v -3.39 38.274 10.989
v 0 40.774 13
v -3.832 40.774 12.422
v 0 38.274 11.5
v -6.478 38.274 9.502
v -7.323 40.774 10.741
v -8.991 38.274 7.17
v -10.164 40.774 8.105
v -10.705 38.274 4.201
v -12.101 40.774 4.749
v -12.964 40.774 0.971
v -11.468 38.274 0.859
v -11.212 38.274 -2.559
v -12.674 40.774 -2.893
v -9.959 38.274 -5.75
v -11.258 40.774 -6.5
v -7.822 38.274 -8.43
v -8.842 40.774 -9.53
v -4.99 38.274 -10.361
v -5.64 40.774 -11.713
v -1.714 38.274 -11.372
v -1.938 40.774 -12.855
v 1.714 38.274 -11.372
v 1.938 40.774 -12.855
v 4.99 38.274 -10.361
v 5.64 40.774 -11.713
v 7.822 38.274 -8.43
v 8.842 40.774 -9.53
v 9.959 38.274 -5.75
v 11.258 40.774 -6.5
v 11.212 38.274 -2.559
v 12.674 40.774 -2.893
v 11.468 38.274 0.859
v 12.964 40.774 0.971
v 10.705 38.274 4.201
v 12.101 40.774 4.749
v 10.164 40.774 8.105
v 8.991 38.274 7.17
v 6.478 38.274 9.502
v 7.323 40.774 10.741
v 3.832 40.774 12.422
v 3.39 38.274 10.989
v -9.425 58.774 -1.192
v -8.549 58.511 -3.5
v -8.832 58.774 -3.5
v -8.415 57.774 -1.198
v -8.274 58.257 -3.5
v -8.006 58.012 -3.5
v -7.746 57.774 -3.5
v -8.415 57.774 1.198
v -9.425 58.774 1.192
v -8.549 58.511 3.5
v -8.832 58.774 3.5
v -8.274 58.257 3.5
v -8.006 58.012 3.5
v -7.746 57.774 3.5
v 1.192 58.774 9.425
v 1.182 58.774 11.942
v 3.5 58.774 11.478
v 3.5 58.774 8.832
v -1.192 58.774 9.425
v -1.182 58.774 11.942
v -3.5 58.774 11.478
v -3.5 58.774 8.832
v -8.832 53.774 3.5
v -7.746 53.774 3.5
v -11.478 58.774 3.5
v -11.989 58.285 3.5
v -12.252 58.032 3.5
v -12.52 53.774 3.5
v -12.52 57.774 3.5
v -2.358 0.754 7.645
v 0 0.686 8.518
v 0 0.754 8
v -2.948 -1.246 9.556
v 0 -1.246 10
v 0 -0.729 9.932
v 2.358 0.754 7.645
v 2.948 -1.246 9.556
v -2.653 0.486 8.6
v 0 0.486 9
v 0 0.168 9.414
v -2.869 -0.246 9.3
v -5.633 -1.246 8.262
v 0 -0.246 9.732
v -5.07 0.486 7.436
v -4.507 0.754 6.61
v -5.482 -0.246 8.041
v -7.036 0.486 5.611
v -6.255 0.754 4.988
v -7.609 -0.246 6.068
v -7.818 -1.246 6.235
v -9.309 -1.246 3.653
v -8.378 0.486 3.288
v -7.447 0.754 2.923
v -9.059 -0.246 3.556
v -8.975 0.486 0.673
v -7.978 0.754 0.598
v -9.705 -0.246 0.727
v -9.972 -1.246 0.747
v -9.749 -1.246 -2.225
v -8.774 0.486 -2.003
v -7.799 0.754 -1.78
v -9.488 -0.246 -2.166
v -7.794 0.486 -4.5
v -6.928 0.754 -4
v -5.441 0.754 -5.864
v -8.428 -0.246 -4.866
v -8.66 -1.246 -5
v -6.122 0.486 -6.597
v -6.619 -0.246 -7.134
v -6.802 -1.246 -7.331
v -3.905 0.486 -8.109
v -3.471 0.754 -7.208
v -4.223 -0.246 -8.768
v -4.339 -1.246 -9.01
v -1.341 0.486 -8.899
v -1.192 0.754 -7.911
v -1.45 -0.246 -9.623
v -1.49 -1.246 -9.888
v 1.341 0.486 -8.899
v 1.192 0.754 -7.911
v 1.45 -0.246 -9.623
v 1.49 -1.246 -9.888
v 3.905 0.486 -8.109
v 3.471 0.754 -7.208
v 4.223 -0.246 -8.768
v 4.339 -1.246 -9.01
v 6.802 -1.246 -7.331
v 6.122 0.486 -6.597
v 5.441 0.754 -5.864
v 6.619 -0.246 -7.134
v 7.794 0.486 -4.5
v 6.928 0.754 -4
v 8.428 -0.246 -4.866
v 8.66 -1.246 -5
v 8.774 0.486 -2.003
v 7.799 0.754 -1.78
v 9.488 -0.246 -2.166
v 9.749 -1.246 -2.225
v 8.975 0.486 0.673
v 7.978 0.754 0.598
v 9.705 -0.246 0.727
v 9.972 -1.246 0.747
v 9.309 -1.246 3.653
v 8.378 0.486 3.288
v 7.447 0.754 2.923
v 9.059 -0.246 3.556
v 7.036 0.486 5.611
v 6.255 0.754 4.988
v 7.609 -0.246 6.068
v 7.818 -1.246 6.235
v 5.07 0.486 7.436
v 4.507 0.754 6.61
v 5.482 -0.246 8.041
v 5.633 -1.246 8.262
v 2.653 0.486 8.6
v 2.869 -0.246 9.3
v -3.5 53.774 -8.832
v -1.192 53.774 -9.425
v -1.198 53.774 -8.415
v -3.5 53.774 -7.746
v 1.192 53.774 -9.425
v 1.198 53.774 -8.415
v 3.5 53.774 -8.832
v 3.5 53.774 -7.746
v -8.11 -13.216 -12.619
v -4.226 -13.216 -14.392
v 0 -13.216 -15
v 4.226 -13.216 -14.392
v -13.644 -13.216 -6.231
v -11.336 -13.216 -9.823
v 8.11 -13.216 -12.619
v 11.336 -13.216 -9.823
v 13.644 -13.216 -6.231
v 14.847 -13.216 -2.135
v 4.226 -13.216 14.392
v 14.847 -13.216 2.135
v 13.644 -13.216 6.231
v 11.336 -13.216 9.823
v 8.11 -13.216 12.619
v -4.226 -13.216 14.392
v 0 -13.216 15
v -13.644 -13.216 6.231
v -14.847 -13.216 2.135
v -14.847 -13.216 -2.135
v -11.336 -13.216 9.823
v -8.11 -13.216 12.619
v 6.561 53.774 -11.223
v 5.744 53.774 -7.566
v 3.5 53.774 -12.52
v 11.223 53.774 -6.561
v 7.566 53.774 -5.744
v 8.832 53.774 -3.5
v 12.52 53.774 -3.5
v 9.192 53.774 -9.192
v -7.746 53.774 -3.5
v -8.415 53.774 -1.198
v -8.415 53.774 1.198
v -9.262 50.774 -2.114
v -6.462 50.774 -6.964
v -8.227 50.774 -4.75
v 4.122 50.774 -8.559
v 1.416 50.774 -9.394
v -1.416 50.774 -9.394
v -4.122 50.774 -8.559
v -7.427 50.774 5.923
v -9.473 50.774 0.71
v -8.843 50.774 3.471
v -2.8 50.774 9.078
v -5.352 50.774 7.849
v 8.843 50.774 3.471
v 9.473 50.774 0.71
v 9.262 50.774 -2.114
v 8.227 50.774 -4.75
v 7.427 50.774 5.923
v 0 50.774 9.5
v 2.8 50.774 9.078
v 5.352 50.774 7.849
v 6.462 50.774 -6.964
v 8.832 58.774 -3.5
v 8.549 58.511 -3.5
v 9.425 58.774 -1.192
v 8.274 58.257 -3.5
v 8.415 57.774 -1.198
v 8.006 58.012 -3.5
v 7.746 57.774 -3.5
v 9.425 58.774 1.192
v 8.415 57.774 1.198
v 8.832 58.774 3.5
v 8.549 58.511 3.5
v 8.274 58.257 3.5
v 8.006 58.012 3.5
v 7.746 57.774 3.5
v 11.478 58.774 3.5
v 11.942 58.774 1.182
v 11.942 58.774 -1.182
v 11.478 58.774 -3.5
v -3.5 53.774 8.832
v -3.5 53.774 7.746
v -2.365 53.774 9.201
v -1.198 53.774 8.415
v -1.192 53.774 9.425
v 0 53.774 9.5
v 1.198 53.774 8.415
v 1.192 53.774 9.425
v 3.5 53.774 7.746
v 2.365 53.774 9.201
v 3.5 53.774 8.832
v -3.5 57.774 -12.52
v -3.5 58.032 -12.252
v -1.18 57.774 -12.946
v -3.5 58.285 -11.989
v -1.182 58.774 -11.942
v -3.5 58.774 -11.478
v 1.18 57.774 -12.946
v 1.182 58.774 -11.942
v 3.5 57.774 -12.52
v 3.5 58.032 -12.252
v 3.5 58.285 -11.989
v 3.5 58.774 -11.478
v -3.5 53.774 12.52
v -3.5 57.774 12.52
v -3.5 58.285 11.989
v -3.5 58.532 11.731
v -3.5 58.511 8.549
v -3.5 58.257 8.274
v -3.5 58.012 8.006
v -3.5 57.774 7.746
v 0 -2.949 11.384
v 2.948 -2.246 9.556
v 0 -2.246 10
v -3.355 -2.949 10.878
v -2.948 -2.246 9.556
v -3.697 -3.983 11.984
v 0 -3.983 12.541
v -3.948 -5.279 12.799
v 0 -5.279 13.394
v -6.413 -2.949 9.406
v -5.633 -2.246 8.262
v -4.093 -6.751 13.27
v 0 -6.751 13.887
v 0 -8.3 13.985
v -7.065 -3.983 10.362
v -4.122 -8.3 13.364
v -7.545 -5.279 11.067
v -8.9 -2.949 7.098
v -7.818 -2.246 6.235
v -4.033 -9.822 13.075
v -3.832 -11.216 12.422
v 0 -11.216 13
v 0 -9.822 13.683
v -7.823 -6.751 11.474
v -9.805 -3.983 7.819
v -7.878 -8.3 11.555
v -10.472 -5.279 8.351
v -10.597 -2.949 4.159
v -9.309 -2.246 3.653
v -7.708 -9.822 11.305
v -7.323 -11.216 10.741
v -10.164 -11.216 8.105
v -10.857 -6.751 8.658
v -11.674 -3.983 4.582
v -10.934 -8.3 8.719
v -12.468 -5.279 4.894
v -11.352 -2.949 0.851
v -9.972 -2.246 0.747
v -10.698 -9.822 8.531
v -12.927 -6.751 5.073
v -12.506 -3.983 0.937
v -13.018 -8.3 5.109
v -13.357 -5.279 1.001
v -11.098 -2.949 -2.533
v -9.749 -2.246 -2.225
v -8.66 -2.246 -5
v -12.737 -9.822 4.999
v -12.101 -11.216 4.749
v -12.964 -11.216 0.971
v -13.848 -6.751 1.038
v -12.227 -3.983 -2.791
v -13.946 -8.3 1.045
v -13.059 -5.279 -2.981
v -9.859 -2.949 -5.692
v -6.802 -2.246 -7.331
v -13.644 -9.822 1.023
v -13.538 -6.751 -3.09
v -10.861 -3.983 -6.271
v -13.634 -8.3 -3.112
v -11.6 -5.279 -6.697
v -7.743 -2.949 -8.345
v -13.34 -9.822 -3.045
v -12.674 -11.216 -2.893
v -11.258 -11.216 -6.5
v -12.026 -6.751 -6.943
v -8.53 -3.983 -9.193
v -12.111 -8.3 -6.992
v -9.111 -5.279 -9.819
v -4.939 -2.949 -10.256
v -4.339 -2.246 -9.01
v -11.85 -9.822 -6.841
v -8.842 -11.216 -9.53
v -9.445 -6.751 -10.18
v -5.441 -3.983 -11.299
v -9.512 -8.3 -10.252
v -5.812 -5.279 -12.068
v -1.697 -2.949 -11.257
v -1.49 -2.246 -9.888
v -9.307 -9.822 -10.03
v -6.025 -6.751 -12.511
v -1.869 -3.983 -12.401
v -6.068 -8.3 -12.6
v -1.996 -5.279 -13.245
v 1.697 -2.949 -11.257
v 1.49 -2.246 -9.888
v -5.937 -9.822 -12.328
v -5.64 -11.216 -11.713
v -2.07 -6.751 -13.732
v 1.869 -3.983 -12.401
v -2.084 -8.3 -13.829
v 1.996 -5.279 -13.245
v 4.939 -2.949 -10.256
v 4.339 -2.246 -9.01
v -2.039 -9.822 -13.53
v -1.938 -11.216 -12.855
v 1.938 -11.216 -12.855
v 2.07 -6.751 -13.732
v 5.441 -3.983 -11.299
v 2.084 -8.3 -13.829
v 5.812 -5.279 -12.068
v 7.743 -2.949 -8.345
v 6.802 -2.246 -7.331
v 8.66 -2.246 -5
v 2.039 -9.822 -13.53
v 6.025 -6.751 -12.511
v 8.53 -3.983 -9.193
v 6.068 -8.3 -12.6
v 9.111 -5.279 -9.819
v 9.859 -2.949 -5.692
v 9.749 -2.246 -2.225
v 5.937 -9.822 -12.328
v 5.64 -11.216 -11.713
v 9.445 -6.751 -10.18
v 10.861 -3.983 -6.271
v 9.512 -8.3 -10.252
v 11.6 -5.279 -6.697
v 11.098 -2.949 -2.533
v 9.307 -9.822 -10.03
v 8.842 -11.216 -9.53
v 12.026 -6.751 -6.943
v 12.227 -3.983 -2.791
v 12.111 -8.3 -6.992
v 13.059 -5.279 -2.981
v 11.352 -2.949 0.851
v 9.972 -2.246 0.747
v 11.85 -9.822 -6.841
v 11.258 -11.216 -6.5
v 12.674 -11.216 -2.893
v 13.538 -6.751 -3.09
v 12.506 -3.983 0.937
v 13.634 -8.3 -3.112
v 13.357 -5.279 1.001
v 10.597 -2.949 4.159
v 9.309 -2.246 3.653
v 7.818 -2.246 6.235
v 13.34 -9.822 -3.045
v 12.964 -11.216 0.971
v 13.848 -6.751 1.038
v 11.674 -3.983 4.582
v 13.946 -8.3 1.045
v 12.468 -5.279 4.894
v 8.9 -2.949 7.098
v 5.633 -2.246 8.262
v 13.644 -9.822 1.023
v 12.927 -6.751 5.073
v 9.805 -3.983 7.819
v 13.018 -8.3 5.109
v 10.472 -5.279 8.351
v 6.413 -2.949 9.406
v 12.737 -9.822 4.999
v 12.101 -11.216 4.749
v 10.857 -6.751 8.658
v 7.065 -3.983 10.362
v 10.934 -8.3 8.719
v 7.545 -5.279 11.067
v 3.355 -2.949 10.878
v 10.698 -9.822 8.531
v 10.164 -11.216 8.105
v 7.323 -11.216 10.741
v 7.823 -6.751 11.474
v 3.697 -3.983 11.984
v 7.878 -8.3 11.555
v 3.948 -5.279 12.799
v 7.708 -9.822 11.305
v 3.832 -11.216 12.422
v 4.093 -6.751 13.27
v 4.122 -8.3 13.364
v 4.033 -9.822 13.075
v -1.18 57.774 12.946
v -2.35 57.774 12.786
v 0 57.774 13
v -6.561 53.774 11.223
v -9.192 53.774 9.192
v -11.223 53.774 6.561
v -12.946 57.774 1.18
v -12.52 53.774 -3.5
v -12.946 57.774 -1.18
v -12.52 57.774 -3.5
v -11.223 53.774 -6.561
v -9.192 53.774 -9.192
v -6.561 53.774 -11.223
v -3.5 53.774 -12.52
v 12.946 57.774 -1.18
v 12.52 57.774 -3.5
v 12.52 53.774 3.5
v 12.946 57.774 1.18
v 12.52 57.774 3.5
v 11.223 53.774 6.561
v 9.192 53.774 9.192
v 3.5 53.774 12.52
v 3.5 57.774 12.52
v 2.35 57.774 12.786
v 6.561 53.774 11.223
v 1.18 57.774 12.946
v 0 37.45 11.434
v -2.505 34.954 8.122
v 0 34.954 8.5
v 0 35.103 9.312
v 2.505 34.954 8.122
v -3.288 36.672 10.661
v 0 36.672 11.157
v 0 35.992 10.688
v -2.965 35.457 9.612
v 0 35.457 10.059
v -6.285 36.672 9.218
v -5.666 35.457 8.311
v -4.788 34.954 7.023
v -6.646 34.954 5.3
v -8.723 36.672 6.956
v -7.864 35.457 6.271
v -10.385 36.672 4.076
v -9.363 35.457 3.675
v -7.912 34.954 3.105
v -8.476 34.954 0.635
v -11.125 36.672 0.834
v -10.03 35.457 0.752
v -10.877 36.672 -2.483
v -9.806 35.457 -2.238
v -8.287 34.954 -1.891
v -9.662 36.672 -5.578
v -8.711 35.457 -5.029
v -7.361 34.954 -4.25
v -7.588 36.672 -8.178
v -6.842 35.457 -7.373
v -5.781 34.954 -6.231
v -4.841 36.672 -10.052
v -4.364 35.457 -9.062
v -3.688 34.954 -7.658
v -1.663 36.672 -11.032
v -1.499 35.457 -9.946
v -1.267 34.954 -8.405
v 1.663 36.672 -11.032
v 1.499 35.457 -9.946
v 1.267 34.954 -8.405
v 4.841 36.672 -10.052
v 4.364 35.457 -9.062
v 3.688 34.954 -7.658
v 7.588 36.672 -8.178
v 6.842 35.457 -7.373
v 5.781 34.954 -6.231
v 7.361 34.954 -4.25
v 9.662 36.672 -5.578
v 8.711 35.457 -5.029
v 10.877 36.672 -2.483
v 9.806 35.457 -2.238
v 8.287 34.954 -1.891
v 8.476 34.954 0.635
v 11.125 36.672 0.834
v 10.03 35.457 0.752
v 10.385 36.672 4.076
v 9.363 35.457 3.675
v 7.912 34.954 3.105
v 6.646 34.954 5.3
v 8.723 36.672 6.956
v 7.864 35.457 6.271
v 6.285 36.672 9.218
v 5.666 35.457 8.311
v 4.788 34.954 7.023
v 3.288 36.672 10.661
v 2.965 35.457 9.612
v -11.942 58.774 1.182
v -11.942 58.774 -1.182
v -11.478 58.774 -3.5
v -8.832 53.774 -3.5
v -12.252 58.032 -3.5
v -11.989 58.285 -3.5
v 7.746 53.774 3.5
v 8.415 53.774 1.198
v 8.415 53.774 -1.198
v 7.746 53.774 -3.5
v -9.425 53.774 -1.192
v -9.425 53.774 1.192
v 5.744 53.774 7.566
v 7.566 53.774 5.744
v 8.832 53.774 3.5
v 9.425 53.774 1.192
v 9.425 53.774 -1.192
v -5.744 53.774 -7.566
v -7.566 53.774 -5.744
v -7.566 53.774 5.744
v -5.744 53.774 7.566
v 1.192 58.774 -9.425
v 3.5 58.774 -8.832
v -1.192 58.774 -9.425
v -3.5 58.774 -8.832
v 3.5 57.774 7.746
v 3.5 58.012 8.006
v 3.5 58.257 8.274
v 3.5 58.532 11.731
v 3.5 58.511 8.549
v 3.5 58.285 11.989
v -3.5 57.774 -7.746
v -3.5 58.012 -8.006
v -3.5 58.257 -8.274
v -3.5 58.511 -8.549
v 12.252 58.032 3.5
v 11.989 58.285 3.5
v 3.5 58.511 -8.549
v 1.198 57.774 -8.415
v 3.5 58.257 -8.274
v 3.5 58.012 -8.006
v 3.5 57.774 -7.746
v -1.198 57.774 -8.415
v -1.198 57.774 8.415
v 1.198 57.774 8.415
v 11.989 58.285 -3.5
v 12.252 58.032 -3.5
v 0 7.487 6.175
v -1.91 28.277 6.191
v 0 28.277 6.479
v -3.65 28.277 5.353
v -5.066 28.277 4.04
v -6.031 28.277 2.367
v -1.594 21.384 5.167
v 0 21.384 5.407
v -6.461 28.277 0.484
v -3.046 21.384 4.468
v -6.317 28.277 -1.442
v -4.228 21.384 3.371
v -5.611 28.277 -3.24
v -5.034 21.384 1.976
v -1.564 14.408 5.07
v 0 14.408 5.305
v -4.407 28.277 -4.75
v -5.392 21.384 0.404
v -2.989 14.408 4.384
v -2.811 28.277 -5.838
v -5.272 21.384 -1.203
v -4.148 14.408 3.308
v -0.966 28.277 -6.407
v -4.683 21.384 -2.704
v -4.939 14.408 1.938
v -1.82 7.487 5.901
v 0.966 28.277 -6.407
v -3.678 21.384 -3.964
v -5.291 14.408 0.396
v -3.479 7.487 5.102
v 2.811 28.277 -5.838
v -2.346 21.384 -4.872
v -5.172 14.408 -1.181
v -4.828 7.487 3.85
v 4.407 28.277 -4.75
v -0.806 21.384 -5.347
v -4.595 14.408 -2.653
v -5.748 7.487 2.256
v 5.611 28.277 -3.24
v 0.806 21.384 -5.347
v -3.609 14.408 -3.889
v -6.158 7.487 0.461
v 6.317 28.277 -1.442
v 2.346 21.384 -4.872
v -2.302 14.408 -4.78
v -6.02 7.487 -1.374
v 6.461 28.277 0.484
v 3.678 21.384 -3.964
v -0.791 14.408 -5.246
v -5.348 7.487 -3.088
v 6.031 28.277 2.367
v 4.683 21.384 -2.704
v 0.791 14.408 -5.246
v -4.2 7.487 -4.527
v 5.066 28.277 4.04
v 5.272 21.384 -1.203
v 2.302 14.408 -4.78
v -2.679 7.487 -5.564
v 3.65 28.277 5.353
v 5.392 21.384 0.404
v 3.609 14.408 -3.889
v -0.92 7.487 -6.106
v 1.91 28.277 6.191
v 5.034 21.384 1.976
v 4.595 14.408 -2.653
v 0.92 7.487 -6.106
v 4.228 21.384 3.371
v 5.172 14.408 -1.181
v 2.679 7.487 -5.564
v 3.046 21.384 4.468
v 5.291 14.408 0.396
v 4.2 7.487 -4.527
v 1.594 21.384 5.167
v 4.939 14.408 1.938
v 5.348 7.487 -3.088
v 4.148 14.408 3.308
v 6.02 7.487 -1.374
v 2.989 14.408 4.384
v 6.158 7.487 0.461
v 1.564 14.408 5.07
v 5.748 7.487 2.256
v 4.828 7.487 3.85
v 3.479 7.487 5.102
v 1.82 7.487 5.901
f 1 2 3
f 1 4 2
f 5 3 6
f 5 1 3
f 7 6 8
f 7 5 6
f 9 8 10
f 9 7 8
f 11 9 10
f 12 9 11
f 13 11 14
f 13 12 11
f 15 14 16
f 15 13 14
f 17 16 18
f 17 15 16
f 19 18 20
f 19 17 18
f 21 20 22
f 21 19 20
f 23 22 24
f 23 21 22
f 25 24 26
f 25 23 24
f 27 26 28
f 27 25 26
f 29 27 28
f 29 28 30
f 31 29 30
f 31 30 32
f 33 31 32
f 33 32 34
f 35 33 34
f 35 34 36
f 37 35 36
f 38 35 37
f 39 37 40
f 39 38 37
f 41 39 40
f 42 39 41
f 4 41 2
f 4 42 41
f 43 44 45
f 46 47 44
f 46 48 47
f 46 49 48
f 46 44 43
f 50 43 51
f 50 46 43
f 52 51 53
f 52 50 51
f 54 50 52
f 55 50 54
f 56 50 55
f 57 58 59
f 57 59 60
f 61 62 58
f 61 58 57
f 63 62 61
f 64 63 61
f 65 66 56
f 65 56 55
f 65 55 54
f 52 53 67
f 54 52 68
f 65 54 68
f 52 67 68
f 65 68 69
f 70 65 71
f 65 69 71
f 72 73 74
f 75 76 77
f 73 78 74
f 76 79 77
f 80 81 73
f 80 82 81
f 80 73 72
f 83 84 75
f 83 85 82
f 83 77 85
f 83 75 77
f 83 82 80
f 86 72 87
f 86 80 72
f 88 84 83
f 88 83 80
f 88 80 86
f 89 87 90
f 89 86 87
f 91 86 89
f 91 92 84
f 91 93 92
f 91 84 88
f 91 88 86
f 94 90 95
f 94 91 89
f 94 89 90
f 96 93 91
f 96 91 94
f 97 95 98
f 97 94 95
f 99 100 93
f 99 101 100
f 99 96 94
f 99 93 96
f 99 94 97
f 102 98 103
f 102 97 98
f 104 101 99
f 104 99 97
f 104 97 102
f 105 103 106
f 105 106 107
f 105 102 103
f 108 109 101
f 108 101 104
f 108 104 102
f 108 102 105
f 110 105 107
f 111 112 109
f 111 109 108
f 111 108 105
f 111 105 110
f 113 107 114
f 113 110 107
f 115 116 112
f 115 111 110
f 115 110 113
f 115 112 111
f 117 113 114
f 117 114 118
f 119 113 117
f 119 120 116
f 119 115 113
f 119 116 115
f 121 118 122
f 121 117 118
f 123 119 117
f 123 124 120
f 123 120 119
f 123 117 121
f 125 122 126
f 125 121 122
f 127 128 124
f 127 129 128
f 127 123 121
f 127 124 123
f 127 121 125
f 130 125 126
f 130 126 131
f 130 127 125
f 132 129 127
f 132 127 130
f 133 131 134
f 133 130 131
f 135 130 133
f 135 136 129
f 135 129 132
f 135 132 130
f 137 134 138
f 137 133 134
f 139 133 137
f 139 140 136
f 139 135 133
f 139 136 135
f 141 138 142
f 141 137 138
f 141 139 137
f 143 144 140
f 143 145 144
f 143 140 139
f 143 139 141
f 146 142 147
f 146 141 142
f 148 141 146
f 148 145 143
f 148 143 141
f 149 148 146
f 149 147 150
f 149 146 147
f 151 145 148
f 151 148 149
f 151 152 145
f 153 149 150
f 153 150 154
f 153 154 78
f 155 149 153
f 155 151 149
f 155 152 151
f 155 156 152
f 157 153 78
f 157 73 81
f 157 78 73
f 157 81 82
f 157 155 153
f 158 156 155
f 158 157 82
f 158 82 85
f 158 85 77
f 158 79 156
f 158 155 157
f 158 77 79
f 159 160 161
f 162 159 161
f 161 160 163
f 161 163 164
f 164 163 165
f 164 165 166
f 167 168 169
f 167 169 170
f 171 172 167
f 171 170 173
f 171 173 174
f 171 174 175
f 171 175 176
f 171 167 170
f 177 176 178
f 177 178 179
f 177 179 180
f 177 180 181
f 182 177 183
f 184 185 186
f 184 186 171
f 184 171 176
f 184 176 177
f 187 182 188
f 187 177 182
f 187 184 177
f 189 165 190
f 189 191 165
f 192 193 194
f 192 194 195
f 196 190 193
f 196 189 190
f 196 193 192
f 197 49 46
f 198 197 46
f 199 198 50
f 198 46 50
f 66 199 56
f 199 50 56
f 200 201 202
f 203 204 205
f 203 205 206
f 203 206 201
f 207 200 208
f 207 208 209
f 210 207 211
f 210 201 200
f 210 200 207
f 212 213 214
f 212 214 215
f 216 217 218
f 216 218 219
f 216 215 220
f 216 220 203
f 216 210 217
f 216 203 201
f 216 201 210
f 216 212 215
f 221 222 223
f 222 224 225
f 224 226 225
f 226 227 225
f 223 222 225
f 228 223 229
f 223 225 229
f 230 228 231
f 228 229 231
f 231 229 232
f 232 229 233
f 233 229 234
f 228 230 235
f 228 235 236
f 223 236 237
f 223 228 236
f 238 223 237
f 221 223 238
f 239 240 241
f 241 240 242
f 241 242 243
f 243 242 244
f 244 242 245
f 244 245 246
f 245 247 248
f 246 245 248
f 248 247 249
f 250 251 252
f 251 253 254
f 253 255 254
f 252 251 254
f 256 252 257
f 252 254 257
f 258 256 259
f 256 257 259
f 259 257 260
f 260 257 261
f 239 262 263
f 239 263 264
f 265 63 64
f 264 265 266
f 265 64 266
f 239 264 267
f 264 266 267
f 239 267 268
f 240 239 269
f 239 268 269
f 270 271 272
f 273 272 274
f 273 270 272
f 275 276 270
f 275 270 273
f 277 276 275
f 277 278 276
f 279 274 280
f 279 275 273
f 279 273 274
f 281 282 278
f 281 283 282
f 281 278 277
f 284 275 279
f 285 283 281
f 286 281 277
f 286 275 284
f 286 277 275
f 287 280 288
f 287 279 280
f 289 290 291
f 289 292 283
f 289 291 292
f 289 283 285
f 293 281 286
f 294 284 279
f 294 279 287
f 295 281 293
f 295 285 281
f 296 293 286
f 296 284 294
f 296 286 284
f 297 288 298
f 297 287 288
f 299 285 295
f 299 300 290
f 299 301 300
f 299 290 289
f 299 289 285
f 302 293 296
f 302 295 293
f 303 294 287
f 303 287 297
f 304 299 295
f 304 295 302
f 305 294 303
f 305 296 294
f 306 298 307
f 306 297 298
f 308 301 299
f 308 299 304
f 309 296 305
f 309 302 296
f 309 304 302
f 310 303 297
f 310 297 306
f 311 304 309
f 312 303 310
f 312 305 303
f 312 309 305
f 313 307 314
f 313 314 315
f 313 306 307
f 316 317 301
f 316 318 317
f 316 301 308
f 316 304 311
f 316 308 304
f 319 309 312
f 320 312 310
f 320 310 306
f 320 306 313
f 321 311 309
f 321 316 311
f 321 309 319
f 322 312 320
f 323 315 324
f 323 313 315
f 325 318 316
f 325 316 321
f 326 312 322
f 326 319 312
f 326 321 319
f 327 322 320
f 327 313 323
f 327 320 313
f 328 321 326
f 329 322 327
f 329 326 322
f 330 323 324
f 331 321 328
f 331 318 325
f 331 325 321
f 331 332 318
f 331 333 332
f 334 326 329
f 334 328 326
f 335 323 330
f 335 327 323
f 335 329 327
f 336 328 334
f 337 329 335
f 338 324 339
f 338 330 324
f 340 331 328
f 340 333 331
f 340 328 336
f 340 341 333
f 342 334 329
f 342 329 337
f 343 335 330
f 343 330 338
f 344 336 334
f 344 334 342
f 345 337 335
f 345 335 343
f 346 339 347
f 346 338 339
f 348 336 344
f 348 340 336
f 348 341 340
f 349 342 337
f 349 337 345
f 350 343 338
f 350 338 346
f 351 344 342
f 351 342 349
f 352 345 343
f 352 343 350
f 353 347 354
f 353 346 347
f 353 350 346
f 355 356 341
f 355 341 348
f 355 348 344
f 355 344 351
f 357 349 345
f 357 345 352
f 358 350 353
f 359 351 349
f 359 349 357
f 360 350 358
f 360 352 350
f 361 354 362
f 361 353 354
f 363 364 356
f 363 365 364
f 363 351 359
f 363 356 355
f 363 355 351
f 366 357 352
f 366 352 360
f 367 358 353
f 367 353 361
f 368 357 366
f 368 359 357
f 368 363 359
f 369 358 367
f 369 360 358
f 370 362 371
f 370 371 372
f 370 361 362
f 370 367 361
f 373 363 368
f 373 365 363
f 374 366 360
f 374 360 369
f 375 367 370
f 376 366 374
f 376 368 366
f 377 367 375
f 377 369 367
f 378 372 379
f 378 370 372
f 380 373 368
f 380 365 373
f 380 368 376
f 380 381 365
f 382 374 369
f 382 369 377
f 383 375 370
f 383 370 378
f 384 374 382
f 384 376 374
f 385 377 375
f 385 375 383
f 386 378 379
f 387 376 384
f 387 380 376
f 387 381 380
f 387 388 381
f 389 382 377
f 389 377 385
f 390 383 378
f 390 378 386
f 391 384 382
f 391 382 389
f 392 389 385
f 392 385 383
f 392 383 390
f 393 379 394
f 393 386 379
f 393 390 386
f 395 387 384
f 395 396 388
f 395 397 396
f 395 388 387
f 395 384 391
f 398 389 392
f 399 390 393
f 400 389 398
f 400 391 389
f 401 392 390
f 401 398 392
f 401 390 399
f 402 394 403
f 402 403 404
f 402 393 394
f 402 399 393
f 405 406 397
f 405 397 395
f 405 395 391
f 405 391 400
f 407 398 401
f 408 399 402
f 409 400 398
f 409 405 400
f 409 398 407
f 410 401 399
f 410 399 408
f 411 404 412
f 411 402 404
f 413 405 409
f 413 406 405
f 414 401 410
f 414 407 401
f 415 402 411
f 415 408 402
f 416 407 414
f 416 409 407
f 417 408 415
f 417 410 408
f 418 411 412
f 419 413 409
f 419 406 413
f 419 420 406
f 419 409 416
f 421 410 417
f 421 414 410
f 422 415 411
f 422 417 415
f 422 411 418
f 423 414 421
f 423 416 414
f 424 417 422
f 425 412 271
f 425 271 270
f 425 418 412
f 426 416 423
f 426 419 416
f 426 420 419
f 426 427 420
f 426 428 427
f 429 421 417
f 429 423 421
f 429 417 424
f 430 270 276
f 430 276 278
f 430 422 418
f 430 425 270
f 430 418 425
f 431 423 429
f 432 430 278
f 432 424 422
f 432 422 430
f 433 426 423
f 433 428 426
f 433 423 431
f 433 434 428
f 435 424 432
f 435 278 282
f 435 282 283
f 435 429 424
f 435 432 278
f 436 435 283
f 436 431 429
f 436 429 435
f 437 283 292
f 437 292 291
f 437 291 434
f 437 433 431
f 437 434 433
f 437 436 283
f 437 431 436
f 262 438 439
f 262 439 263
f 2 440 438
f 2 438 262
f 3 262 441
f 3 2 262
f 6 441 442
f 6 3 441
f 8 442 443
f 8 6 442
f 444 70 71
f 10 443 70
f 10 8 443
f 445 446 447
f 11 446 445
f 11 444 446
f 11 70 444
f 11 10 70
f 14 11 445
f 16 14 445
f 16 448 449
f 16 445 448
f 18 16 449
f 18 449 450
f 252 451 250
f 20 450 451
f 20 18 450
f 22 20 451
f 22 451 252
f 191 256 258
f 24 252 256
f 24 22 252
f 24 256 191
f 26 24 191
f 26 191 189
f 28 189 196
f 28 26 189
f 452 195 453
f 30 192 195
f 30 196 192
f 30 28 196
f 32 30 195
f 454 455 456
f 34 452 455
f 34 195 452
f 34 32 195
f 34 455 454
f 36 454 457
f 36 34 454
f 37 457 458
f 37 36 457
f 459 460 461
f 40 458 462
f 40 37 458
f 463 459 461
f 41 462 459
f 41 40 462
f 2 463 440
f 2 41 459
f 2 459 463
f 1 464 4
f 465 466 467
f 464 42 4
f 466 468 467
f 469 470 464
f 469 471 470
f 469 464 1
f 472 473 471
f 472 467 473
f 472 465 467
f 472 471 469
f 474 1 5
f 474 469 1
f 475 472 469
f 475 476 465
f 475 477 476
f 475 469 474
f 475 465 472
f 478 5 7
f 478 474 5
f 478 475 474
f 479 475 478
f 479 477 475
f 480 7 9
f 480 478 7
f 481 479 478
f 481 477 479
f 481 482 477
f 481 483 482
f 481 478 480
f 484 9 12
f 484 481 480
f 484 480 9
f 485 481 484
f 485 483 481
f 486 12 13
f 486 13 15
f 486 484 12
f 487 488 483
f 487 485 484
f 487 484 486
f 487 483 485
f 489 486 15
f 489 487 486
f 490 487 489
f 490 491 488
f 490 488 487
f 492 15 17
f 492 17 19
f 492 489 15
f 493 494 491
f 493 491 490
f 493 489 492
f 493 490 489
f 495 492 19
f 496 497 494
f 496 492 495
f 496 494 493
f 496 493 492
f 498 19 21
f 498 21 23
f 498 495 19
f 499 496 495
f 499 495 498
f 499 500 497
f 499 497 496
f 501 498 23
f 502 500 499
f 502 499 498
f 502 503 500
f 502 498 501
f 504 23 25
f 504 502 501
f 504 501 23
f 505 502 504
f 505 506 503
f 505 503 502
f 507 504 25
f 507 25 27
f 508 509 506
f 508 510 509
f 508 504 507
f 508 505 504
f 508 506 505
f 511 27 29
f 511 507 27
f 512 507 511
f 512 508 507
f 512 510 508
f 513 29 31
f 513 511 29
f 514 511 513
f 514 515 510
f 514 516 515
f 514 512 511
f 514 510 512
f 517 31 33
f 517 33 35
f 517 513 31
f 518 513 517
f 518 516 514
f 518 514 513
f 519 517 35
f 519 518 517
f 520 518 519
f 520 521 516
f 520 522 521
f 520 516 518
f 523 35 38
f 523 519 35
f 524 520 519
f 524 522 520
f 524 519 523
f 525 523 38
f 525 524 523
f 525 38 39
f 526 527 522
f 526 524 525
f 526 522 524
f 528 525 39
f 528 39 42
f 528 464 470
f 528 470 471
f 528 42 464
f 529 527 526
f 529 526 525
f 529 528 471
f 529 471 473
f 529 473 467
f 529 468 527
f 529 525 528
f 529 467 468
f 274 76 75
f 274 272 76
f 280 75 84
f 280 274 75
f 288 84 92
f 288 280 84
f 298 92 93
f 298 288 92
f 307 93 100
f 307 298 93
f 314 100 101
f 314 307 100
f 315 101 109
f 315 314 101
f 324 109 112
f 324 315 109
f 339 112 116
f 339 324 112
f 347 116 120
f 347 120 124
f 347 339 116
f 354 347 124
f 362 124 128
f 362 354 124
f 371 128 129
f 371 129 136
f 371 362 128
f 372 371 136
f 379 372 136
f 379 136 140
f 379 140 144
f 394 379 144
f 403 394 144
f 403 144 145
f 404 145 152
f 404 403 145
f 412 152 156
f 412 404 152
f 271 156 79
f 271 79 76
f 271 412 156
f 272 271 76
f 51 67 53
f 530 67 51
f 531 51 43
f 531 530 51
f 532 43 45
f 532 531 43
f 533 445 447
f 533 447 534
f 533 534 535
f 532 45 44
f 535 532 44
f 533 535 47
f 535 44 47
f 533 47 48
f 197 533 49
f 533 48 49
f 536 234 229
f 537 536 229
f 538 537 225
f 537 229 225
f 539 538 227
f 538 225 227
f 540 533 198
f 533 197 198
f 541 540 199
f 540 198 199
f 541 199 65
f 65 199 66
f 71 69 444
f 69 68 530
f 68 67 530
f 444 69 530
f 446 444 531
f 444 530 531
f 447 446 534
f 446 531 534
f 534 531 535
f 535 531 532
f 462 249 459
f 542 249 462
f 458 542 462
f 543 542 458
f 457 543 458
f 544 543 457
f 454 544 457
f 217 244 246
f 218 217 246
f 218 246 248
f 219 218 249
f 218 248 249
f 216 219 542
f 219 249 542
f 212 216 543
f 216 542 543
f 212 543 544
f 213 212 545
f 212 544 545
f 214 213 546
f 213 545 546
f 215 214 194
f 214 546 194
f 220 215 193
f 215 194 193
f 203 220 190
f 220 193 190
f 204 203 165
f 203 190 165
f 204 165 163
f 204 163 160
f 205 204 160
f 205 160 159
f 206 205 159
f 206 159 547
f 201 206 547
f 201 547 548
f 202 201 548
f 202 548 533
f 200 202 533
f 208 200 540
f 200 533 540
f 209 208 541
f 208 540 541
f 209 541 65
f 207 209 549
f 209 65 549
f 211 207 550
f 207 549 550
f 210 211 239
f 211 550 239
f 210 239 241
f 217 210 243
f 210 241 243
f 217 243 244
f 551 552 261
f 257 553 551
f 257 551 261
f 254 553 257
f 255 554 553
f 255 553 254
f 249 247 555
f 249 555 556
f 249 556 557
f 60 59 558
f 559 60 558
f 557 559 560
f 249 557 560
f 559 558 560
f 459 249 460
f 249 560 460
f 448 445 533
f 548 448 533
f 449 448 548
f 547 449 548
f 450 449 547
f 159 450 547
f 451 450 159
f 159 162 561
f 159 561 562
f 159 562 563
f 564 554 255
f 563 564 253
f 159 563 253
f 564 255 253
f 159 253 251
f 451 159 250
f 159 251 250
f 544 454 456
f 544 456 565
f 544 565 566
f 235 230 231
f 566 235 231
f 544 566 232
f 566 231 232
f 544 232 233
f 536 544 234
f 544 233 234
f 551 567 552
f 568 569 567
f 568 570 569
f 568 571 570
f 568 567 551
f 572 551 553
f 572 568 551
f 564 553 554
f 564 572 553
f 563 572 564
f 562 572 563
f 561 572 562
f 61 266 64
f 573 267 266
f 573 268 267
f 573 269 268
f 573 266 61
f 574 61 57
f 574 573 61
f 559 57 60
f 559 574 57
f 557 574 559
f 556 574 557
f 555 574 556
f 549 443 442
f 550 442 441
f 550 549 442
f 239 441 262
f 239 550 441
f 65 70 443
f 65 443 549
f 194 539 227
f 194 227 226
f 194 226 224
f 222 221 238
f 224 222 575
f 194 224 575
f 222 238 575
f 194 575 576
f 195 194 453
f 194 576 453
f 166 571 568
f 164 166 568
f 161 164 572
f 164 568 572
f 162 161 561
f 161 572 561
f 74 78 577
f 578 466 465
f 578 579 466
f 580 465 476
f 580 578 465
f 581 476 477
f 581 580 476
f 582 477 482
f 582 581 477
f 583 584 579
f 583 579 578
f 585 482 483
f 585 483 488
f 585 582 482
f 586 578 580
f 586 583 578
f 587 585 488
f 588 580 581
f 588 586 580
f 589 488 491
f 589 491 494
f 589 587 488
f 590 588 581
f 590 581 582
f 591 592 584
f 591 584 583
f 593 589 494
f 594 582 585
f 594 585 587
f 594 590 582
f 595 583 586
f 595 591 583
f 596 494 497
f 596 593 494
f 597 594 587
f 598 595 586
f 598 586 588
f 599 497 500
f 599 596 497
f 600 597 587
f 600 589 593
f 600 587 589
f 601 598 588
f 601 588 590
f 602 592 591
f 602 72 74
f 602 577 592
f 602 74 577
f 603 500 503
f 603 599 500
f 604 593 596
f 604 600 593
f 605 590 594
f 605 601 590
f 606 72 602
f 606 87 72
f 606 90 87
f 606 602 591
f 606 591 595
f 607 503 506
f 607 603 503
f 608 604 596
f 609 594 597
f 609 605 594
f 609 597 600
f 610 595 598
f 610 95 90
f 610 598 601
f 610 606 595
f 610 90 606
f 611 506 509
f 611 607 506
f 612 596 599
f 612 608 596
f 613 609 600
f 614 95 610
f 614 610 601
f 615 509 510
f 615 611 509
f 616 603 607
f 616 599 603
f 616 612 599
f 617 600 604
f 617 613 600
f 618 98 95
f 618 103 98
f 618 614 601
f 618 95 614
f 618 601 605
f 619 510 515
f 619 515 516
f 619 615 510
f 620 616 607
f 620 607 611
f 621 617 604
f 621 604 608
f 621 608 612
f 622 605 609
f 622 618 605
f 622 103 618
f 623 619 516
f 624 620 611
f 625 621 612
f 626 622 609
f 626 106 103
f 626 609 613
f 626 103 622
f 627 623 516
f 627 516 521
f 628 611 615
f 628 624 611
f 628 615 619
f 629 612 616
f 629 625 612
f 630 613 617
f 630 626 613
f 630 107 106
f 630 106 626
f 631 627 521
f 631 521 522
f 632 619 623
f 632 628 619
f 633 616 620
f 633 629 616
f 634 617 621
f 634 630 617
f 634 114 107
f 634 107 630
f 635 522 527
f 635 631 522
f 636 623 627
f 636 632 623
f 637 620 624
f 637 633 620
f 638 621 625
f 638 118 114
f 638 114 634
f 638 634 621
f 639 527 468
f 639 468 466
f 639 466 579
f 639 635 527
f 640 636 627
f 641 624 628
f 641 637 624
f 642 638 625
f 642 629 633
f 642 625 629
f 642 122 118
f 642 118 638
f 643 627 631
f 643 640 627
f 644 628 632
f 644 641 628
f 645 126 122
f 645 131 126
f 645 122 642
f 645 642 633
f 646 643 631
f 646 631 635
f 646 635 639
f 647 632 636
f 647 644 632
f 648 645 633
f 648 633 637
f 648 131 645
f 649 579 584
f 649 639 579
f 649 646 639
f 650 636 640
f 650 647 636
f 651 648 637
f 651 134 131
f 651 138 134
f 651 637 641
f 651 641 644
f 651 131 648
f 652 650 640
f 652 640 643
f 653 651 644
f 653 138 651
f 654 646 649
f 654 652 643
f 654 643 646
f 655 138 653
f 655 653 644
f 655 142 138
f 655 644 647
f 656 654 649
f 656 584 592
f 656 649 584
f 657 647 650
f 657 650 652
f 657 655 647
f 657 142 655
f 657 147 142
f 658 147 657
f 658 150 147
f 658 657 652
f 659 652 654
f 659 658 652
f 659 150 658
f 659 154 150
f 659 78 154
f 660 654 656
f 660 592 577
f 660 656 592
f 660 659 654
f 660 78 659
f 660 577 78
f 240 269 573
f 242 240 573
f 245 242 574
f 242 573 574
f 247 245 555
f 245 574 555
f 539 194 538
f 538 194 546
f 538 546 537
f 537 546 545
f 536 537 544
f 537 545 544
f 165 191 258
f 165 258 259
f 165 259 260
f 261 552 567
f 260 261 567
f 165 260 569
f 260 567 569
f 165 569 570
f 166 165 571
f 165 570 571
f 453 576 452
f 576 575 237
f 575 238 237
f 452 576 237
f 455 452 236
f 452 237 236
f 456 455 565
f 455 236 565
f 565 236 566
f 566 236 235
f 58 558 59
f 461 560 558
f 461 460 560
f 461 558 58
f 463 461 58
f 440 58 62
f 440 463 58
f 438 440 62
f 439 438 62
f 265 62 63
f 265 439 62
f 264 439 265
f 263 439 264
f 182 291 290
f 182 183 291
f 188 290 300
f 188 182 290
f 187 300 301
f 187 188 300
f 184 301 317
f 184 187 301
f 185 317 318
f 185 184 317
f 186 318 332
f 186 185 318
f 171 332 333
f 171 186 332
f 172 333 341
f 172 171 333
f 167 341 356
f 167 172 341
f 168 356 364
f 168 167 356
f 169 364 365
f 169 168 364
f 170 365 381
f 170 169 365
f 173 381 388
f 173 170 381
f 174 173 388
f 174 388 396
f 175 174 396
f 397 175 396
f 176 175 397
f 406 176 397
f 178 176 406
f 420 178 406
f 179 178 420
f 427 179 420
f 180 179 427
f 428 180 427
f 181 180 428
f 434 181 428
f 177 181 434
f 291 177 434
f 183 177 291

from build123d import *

# Parameters (mm, degrees)
CUT_EXTRUDE1_DEPTH = 5
SKETCH3_R          = 8.5
CUT_EXTRUDE2_DEPTH = 5
SKETCH5_R          = 9.5
CUT_EXTRUDE3_DEPTH = 3
CHAMFER1_SIZE      = 1


with BuildPart() as part:
    # Sketch1 → Revolve2 (revolve)
    with BuildSketch(Plane.XY, mode=Mode.PRIVATE) as revolve2_sk:
        with BuildLine():
            Line((0, -13.216216216), (0, 58.773783784))
            Line((0, 58.773783784), (-13, 58.773783784))
            Line((-13, 58.773783784), (-13, 40.773783784))
            Line((-13, 40.773783784), (-11.5, 38.273783784))
            ThreePointArc((-11.5, 38.273783784), (-10.687594514, 35.99246344), (-8.5, 34.953783784))
            ThreePointArc((-8.5, 34.953783784), (-5.234654729, 17.897867779), (-8, 0.753783784))
            ThreePointArc((-8, 0.753783784), (-9.414213562, 0.167997346), (-10, -1.246216216))
            Line((-10, -1.246216216), (-10, -2.246216216))
            ThreePointArc((-10, -2.246216216), (-13.688325627, -5.999334736), (-13, -11.216216216))
            Line((-13, -11.216216216), (-15, -13.216216216))
            Line((-15, -13.216216216), (0, -13.216216216))
        make_face()
    revolve(revolve2_sk.sketch.rotate(Axis((0, 81.004684333, 0), (0, -1, 0)), 270), axis=Axis((0, 81.004684333, 0), (0, -1, 0)))

    # Sketch2 → Cut-Extrude1 (cut)
    with BuildSketch(Plane(origin=(0, 58.773783784, 0), x_dir=(1, 0, 0), z_dir=(0, 1, 0))):
        with BuildLine():
            Line((-3.5, 7.745966692), (-3.5, 12.519984026))
            ThreePointArc((-3.5, 12.519984026), (-9.192388155, 9.192388155), (-12.519984026, 3.5))
            Line((-12.519984026, 3.5), (-7.745966692, 3.5))
            ThreePointArc((-7.745966692, 3.5), (-6.01040764, 6.01040764), (-3.5, 7.745966692))
        make_face()
        with BuildLine():
            ThreePointArc((-12.519984026, -3.5), (-9.192388155, -9.192388155), (-3.5, -12.519984026))
            Line((-3.5, -12.519984026), (-3.5, -7.745966692))
            ThreePointArc((-3.5, -7.745966692), (-6.01040764, -6.01040764), (-7.745966692, -3.5))
            Line((-7.745966692, -3.5), (-12.519984026, -3.5))
        make_face()
        with BuildLine():
            ThreePointArc((3.5, -12.519984026), (9.192388155, -9.192388155), (12.519984026, -3.5))
            Line((12.519984026, -3.5), (7.745966692, -3.5))
            ThreePointArc((7.745966692, -3.5), (6.01040764, -6.01040764), (3.5, -7.745966692))
            Line((3.5, -7.745966692), (3.5, -12.519984026))
        make_face()
        with BuildLine():
            ThreePointArc((3.5, 7.745966692), (6.01040764, 6.01040764), (7.745966692, 3.5))
            Line((7.745966692, 3.5), (12.519984026, 3.5))
            ThreePointArc((12.519984026, 3.5), (9.192388155, 9.192388155), (3.5, 12.519984026))
            Line((3.5, 12.519984026), (3.5, 7.745966692))
        make_face()
    extrude(amount=-CUT_EXTRUDE1_DEPTH, mode=Mode.SUBTRACT)

    # Sketch3 → Cut-Extrude2 (cut)
    with BuildSketch(Plane(origin=(0, 58.773783784, 0), x_dir=(1, 0, 0), z_dir=(0, 1, 0))):
        Circle(SKETCH3_R)
    extrude(amount=-CUT_EXTRUDE2_DEPTH, mode=Mode.SUBTRACT)

    # Sketch5 → Cut-Extrude3 (cut)
    with BuildSketch(Plane(origin=(0, 53.773783784, 0), x_dir=(1, 0, 0), z_dir=(0, 1, 0))):
        with Locations(Location((0, 0, 0), (0, 0, 270))):
            Circle(SKETCH5_R)
    extrude(amount=-CUT_EXTRUDE3_DEPTH, mode=Mode.SUBTRACT)

    # Chamfer1
    chamfer1_edges = [part.edges().sort_by_distance(p)[0] for p in [
        (13, 58.773783784, 0),
        (0, 58.773783784, -13),
        (-13, 58.773783784, 0),
        (1.766381565, 58.773783784, 12.879436951),
        (8.5, 58.773783784, 0),
        (0, 58.773783784, -8.5),
        (-8.5, 58.773783784, 0),
        (0, 58.773783784, 8.5),
    ]]
    chamfer(chamfer1_edges, length=CHAMFER1_SIZE)


solid = part.part
